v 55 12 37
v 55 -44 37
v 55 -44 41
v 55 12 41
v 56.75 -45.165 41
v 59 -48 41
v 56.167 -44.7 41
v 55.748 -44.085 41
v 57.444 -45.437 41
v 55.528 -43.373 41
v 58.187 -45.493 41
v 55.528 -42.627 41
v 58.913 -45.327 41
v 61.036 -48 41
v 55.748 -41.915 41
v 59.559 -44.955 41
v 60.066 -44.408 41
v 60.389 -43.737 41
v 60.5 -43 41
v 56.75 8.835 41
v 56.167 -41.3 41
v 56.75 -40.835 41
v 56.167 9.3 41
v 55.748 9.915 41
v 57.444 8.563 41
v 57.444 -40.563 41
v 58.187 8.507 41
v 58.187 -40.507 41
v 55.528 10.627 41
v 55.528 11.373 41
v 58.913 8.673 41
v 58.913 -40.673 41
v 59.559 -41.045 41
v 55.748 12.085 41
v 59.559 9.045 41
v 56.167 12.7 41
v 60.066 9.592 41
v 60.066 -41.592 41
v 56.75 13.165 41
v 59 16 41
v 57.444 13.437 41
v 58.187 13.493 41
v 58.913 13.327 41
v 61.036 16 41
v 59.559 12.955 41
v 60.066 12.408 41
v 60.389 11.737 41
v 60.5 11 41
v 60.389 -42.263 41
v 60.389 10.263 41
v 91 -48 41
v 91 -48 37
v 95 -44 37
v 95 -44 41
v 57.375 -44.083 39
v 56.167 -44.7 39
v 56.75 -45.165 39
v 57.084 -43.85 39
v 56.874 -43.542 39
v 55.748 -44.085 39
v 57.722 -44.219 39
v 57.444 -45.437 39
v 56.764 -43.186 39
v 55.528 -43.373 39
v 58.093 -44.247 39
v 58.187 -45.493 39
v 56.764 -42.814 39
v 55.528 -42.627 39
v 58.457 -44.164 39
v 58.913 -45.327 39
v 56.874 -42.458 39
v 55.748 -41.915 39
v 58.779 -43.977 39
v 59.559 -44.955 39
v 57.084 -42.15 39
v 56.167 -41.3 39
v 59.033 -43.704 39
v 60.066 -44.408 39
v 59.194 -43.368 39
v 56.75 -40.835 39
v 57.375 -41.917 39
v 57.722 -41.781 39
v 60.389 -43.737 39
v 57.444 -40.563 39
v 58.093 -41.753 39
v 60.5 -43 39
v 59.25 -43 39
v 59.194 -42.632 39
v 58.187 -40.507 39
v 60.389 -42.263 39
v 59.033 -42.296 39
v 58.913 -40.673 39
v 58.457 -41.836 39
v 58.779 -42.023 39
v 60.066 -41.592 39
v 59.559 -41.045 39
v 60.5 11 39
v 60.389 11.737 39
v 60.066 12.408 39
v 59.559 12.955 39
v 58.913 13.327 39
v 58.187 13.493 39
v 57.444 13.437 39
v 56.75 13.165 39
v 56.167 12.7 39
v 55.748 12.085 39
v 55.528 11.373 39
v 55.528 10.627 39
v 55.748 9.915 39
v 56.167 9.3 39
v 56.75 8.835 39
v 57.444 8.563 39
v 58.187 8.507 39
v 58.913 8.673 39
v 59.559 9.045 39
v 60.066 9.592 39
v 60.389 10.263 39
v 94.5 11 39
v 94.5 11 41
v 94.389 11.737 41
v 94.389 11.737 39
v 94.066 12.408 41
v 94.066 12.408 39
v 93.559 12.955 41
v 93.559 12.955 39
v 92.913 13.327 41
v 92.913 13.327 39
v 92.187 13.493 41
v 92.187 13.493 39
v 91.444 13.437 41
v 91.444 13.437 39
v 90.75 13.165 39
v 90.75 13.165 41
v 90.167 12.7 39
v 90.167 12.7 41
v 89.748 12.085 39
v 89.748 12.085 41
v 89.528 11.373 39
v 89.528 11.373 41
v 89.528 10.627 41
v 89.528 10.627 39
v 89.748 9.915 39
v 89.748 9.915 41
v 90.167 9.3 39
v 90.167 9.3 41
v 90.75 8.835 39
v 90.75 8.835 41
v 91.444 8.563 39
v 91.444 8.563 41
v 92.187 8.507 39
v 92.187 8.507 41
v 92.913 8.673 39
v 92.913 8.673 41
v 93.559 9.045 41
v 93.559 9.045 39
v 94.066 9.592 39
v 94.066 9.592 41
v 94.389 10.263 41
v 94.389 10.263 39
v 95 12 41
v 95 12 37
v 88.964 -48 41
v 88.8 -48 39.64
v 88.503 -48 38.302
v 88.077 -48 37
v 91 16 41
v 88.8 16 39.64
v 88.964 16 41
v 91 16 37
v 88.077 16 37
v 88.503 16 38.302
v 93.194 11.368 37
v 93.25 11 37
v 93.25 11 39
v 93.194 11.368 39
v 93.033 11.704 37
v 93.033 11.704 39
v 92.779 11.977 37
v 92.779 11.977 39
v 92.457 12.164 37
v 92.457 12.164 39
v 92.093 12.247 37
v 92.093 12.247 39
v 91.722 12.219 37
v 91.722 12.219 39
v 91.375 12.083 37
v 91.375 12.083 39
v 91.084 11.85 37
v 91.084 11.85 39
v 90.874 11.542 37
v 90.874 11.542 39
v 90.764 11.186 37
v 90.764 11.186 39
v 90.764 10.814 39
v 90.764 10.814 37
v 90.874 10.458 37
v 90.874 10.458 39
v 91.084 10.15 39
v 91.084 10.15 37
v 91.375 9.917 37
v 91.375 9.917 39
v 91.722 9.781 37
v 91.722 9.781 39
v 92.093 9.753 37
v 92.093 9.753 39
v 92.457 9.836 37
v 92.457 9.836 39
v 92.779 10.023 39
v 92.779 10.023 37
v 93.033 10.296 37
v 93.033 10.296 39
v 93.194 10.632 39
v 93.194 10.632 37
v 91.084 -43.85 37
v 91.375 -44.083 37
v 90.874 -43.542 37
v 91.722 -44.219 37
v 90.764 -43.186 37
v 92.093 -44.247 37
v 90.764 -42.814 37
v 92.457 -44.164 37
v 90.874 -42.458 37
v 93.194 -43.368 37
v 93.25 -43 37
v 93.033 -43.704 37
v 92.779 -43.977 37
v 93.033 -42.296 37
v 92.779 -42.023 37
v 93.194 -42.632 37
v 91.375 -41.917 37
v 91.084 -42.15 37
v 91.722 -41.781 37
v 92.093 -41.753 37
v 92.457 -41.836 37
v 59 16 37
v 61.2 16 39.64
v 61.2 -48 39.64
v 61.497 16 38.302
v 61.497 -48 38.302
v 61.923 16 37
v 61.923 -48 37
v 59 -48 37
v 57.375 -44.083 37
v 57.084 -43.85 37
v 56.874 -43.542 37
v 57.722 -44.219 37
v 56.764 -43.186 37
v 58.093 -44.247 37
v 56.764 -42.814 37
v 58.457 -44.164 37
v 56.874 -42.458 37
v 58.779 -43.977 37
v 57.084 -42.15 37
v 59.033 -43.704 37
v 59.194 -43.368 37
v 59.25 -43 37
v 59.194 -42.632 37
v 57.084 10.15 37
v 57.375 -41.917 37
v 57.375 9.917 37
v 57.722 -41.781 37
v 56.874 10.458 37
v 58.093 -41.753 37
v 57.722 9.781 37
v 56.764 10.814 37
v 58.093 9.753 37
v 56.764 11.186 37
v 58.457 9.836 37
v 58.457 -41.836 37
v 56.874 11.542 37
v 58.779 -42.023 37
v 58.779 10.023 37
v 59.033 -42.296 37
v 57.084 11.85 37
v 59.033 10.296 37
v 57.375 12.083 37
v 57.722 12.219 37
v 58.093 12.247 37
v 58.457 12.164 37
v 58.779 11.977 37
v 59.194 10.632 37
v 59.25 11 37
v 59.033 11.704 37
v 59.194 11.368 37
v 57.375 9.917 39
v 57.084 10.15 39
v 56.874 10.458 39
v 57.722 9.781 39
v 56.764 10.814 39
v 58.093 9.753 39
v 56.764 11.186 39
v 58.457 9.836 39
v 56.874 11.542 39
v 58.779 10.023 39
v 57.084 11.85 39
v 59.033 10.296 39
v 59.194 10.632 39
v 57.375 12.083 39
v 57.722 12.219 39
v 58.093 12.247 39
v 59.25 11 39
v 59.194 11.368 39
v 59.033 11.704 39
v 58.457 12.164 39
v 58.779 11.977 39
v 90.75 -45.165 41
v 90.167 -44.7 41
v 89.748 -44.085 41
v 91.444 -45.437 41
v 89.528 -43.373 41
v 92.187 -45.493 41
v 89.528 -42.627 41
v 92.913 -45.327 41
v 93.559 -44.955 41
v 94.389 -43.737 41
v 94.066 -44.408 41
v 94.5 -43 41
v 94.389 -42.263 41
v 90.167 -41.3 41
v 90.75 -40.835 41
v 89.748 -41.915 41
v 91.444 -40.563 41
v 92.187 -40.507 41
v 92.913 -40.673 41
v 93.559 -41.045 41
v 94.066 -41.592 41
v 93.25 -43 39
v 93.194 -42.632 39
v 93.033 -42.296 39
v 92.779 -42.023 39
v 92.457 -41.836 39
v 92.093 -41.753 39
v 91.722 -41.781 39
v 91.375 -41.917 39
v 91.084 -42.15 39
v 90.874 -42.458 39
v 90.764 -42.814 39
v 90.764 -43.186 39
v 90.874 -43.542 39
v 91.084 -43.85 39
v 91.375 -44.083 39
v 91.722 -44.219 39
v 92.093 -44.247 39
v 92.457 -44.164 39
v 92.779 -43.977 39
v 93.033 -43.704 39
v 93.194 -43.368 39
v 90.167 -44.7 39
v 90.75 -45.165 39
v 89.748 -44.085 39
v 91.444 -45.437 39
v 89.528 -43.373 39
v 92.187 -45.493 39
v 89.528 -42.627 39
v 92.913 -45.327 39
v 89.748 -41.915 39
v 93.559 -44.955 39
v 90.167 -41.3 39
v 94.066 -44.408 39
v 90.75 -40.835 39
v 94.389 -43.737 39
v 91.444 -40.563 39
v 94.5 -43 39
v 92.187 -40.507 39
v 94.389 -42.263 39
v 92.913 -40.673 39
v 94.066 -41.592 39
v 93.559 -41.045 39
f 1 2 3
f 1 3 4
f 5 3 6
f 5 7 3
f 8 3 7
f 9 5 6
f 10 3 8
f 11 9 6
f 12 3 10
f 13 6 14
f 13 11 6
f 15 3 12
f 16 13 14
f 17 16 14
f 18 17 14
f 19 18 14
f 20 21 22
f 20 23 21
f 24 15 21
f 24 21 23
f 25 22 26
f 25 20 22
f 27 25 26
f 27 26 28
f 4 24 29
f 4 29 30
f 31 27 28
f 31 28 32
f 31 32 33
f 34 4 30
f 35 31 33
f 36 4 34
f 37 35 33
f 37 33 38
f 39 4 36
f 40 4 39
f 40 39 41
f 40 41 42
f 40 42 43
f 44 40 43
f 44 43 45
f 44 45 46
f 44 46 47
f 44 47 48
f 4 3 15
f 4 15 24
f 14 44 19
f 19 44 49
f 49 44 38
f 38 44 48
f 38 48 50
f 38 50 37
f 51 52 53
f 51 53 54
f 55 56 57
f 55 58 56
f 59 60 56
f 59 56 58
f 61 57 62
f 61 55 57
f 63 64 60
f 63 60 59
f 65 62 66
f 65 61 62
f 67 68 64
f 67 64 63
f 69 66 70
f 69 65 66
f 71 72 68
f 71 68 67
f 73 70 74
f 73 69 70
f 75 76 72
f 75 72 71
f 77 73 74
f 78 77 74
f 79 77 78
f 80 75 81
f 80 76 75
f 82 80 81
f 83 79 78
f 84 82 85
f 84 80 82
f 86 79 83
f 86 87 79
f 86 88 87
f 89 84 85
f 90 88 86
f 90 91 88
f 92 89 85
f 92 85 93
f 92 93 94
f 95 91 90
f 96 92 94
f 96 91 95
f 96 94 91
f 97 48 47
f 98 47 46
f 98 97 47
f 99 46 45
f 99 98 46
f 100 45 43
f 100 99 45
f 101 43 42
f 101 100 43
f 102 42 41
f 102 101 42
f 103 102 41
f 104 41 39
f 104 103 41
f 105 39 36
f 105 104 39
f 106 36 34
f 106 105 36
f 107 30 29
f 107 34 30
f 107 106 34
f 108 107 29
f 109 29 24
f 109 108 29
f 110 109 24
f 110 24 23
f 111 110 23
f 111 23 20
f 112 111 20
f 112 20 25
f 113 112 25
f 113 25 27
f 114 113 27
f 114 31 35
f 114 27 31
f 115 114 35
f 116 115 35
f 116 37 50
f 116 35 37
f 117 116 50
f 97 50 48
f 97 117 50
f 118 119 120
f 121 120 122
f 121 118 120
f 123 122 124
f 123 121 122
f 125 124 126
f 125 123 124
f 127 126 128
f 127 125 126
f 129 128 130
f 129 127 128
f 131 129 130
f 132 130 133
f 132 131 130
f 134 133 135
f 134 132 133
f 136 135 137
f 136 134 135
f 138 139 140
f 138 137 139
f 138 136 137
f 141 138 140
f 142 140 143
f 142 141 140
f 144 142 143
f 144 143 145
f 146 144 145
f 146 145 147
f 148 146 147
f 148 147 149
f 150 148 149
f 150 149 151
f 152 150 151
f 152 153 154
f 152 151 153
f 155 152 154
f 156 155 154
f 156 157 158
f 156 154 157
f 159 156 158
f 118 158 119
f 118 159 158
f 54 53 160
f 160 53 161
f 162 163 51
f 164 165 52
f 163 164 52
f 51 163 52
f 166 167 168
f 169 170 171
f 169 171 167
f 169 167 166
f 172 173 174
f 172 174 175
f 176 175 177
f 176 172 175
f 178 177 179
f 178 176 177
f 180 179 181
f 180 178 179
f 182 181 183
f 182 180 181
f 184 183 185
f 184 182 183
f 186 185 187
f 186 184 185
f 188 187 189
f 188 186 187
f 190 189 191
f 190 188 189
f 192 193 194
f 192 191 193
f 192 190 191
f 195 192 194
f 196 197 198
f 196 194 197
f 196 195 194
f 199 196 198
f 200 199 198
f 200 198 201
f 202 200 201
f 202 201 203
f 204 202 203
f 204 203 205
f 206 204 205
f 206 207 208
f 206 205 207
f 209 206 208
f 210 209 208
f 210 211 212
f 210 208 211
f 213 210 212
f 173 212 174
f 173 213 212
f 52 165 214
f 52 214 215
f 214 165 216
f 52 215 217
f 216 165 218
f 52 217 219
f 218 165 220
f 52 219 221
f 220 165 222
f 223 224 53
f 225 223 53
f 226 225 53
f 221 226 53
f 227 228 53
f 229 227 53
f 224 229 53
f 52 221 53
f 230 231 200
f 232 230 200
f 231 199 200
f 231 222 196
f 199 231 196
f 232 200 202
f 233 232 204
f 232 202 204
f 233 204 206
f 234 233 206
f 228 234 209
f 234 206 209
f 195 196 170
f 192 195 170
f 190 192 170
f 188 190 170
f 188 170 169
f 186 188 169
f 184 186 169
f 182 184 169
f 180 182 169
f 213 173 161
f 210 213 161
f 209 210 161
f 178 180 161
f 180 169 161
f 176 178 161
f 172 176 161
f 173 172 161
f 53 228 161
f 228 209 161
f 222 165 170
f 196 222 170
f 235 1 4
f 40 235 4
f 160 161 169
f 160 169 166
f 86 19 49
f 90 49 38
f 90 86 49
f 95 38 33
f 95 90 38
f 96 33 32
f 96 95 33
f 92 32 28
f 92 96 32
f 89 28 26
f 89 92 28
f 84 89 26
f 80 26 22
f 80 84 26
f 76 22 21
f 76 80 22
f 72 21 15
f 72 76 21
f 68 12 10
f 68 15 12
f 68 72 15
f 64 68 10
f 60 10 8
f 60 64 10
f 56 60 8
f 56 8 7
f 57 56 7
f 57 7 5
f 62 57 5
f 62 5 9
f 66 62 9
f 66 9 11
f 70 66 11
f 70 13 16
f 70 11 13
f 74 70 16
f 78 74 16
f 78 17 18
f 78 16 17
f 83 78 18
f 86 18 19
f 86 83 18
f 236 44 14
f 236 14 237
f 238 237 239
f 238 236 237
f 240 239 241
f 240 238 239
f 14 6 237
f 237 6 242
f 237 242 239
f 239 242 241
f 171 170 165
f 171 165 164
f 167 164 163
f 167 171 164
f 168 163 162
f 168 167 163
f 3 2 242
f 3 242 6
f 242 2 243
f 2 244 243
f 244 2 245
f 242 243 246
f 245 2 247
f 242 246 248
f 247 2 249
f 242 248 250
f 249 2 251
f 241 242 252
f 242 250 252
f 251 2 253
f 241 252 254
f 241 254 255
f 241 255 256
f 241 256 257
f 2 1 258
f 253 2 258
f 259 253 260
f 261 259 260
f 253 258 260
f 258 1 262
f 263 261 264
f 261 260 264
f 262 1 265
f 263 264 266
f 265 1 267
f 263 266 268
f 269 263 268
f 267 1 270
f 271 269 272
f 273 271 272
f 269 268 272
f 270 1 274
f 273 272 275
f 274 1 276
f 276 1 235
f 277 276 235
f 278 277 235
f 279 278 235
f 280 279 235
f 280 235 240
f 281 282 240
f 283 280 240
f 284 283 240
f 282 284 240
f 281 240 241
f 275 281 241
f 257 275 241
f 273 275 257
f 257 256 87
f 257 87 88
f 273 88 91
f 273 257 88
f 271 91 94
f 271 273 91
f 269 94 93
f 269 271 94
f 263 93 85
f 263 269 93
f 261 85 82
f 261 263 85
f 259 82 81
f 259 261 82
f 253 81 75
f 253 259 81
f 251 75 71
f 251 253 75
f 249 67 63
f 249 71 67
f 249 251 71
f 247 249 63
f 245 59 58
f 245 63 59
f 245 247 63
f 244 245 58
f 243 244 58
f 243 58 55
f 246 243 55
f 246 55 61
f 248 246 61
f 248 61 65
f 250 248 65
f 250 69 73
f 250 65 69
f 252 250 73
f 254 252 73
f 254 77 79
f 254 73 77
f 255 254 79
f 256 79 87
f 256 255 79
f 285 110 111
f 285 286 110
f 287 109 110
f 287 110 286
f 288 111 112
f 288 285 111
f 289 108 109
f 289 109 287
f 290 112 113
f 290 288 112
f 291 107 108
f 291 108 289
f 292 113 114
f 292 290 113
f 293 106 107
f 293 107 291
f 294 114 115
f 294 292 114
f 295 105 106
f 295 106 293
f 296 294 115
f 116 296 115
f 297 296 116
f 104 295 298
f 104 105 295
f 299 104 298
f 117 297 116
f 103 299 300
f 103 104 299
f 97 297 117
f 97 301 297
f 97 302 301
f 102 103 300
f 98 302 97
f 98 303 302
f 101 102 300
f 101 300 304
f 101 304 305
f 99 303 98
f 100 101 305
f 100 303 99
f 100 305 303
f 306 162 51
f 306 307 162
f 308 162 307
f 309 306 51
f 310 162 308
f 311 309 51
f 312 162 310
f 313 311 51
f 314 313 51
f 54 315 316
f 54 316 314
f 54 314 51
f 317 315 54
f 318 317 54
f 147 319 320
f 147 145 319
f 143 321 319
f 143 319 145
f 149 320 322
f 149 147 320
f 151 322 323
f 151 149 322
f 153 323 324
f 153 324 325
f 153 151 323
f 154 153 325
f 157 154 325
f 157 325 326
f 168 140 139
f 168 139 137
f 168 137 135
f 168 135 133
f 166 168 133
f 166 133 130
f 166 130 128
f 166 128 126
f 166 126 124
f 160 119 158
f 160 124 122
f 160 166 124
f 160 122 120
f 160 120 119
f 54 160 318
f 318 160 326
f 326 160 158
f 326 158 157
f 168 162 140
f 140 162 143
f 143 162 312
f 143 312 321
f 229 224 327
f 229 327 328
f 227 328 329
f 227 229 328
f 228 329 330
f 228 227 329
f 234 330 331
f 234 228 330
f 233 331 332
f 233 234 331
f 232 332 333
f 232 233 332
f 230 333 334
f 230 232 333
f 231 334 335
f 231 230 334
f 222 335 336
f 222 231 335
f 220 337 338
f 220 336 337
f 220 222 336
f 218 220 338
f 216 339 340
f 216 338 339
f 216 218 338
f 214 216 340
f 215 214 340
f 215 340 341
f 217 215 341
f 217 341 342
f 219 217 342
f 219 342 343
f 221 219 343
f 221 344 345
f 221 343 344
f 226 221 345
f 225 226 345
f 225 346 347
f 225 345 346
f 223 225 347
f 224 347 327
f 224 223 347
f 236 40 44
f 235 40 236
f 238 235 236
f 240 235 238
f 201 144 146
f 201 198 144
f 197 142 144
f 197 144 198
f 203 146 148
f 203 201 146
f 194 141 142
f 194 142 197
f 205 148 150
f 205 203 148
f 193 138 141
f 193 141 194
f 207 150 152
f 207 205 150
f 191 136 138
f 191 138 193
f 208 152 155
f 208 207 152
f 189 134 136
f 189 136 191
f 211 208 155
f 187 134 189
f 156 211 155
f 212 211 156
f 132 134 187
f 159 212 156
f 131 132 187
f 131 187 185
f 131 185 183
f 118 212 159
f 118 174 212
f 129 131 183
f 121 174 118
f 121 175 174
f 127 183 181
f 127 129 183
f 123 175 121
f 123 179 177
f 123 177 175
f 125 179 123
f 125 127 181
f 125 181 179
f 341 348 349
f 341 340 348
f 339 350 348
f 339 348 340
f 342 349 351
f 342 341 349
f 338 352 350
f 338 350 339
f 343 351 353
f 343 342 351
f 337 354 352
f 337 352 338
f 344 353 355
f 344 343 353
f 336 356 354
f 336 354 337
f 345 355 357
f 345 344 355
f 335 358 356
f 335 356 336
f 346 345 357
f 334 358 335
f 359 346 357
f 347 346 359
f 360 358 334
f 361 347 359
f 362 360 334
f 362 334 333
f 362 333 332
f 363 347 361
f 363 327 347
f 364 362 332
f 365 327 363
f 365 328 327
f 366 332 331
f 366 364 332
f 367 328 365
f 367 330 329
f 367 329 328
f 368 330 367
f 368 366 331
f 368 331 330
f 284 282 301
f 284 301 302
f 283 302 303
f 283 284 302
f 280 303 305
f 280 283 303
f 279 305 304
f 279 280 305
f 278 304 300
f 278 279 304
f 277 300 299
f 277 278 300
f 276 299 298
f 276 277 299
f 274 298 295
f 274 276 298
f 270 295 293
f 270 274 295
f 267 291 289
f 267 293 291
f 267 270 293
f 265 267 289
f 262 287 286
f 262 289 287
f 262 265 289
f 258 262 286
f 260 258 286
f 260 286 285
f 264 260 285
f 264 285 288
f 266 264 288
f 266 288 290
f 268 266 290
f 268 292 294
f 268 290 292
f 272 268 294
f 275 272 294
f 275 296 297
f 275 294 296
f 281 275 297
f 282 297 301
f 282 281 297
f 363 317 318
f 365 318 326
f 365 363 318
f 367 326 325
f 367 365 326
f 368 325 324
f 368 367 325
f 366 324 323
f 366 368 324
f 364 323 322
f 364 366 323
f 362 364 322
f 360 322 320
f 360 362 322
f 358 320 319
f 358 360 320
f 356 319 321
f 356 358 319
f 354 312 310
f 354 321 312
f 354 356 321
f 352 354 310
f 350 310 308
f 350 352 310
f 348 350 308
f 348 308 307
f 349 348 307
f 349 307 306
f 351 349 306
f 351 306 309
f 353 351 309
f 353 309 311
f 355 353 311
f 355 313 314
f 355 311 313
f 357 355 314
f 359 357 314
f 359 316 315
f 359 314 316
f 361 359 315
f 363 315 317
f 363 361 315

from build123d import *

# Parameters (mm, degrees)
CYLINDER502_R     = 2.5
CYLINDER502_DEPTH = 3
CYLINDER503_R     = 2.5
CYLINDER503_DEPTH = 3
CYLINDER501_R     = 2.5
CYLINDER501_DEPTH = 3
CYLINDER500_R     = 2.5
CYLINDER500_DEPTH = 3
CYLINDER499_R     = 1.25
CYLINDER499_DEPTH = 20
CYLINDER504_R     = 1.25
CYLINDER504_DEPTH = 20
CYLINDER498_R     = 1.25
CYLINDER498_DEPTH = 20
CYLINDER497_R     = 1.25
CYLINDER497_DEPTH = 20
CYLINDER505_R     = 14
CYLINDER505_DEPTH = 64
BOX215_W          = 40
BOX215_H          = 64
BOX215_DEPTH      = 4
CHAMFER004_SIZE   = 4
CHAMFER005_SIZE   = 4


with BuildPart() as v_lec502:
    # Cylinder502 → Cylinder502 (new body)
    with BuildSketch(Plane(origin=(58, -43, 26), x_dir=(1, 0, 0), z_dir=(0, 0, 1))):
        Circle(CYLINDER502_R)
    extrude(amount=CYLINDER502_DEPTH)


with BuildPart() as compound605:
    # Cylinder503 → Cylinder503 (new body)
    with BuildSketch(Plane(origin=(58, 11, 26), x_dir=(1, 0, 0), z_dir=(0, 0, 1))):
        Circle(CYLINDER503_R)
    extrude(amount=CYLINDER503_DEPTH)

    # Compound605: union Válec502
    add(v_lec502.part)


with BuildPart() as compound605_1:
    # Compound605 placement: moved
    add(compound605.part.moved(Location((34, 0, 13))))


with BuildPart() as v_lec501:
    # Cylinder501 → Cylinder501 (new body)
    with BuildSketch(Plane(origin=(58, -43, 26), x_dir=(1, 0, 0), z_dir=(0, 0, 1))):
        Circle(CYLINDER501_R)
    extrude(amount=CYLINDER501_DEPTH)


with BuildPart() as compound607:
    # Cylinder500 → Cylinder500 (new body)
    with BuildSketch(Plane(origin=(58, 11, 26), x_dir=(1, 0, 0), z_dir=(0, 0, 1))):
        Circle(CYLINDER500_R)
    extrude(amount=CYLINDER500_DEPTH)

    # Compound606: union Válec501
    add(v_lec501.part)


with BuildPart() as compound607_1:
    # Compound606 placement: moved
    add(compound607.part.moved(Location((0, 0, 13))))

    # Compound607: union Compound605
    add(compound605_1.part)


with BuildPart() as v_lec499:
    # Cylinder499 → Cylinder499 (new body)
    with BuildSketch(Plane(origin=(58, -43, 26), x_dir=(1, 0, 0), z_dir=(0, 0, 1))):
        Circle(CYLINDER499_R)
    extrude(amount=CYLINDER499_DEPTH)


with BuildPart() as compound610:
    # Cylinder504 → Cylinder504 (new body)
    with BuildSketch(Plane(origin=(58, 11, 26), x_dir=(1, 0, 0), z_dir=(0, 0, 1))):
        Circle(CYLINDER504_R)
    extrude(amount=CYLINDER504_DEPTH)

    # Compound610: union Válec499
    add(v_lec499.part)


with BuildPart() as compound610_1:
    # Compound610 placement: moved
    add(compound610.part.moved(Location((34, 0, 0))))


with BuildPart() as v_lec498:
    # Cylinder498 → Cylinder498 (new body)
    with BuildSketch(Plane(origin=(58, -43, 26), x_dir=(1, 0, 0), z_dir=(0, 0, 1))):
        Circle(CYLINDER498_R)
    extrude(amount=CYLINDER498_DEPTH)


with BuildPart() as compound609:
    # Cylinder497 → Cylinder497 (new body)
    with BuildSketch(Plane(origin=(58, 11, 26), x_dir=(1, 0, 0), z_dir=(0, 0, 1))):
        Circle(CYLINDER497_R)
    extrude(amount=CYLINDER497_DEPTH)

    # Compound608: union Válec498
    add(v_lec498.part)

    # Compound609: union Compound610
    add(compound610_1.part)


with BuildPart() as v_lec505:
    # Cylinder505 → Cylinder505 (new body)
    with BuildSketch(Plane(origin=(75, 16, 42), x_dir=(1, 0, 0), z_dir=(0, -1, 0))):
        Circle(CYLINDER505_R)
    extrude(amount=CYLINDER505_DEPTH)


with BuildPart() as chamfer005:
    # Box215 → Box215 (new body)
    with BuildSketch(Plane(origin=(55, -48, 37), x_dir=(1, 0, 0), z_dir=(0, 0, 1))):
        with Locations((20, 32)):
            Rectangle(BOX215_W, BOX215_H)
    extrude(amount=BOX215_DEPTH)

    # Cut378: cut Válec505
    add(v_lec505.part, mode=Mode.SUBTRACT)

    # Cut379: cut Compound609
    add(compound609.part, mode=Mode.SUBTRACT)

    # Cut380: cut Compound607
    add(compound607_1.part, mode=Mode.SUBTRACT)

    # Chamfer004
    chamfer004_edges = [chamfer005.edges().sort_by_distance(p)[0] for p in [
        (55, -48, 39),
        (95, -48, 39),
    ]]
    chamfer(chamfer004_edges, length=CHAMFER004_SIZE)

    # Chamfer005
    chamfer005_edges = [chamfer005.edges().sort_by_distance(p)[0] for p in [
        (55, 16, 39),
        (95, 16, 39),
    ]]
    chamfer(chamfer005_edges, length=CHAMFER005_SIZE)


solid = chamfer005.part
